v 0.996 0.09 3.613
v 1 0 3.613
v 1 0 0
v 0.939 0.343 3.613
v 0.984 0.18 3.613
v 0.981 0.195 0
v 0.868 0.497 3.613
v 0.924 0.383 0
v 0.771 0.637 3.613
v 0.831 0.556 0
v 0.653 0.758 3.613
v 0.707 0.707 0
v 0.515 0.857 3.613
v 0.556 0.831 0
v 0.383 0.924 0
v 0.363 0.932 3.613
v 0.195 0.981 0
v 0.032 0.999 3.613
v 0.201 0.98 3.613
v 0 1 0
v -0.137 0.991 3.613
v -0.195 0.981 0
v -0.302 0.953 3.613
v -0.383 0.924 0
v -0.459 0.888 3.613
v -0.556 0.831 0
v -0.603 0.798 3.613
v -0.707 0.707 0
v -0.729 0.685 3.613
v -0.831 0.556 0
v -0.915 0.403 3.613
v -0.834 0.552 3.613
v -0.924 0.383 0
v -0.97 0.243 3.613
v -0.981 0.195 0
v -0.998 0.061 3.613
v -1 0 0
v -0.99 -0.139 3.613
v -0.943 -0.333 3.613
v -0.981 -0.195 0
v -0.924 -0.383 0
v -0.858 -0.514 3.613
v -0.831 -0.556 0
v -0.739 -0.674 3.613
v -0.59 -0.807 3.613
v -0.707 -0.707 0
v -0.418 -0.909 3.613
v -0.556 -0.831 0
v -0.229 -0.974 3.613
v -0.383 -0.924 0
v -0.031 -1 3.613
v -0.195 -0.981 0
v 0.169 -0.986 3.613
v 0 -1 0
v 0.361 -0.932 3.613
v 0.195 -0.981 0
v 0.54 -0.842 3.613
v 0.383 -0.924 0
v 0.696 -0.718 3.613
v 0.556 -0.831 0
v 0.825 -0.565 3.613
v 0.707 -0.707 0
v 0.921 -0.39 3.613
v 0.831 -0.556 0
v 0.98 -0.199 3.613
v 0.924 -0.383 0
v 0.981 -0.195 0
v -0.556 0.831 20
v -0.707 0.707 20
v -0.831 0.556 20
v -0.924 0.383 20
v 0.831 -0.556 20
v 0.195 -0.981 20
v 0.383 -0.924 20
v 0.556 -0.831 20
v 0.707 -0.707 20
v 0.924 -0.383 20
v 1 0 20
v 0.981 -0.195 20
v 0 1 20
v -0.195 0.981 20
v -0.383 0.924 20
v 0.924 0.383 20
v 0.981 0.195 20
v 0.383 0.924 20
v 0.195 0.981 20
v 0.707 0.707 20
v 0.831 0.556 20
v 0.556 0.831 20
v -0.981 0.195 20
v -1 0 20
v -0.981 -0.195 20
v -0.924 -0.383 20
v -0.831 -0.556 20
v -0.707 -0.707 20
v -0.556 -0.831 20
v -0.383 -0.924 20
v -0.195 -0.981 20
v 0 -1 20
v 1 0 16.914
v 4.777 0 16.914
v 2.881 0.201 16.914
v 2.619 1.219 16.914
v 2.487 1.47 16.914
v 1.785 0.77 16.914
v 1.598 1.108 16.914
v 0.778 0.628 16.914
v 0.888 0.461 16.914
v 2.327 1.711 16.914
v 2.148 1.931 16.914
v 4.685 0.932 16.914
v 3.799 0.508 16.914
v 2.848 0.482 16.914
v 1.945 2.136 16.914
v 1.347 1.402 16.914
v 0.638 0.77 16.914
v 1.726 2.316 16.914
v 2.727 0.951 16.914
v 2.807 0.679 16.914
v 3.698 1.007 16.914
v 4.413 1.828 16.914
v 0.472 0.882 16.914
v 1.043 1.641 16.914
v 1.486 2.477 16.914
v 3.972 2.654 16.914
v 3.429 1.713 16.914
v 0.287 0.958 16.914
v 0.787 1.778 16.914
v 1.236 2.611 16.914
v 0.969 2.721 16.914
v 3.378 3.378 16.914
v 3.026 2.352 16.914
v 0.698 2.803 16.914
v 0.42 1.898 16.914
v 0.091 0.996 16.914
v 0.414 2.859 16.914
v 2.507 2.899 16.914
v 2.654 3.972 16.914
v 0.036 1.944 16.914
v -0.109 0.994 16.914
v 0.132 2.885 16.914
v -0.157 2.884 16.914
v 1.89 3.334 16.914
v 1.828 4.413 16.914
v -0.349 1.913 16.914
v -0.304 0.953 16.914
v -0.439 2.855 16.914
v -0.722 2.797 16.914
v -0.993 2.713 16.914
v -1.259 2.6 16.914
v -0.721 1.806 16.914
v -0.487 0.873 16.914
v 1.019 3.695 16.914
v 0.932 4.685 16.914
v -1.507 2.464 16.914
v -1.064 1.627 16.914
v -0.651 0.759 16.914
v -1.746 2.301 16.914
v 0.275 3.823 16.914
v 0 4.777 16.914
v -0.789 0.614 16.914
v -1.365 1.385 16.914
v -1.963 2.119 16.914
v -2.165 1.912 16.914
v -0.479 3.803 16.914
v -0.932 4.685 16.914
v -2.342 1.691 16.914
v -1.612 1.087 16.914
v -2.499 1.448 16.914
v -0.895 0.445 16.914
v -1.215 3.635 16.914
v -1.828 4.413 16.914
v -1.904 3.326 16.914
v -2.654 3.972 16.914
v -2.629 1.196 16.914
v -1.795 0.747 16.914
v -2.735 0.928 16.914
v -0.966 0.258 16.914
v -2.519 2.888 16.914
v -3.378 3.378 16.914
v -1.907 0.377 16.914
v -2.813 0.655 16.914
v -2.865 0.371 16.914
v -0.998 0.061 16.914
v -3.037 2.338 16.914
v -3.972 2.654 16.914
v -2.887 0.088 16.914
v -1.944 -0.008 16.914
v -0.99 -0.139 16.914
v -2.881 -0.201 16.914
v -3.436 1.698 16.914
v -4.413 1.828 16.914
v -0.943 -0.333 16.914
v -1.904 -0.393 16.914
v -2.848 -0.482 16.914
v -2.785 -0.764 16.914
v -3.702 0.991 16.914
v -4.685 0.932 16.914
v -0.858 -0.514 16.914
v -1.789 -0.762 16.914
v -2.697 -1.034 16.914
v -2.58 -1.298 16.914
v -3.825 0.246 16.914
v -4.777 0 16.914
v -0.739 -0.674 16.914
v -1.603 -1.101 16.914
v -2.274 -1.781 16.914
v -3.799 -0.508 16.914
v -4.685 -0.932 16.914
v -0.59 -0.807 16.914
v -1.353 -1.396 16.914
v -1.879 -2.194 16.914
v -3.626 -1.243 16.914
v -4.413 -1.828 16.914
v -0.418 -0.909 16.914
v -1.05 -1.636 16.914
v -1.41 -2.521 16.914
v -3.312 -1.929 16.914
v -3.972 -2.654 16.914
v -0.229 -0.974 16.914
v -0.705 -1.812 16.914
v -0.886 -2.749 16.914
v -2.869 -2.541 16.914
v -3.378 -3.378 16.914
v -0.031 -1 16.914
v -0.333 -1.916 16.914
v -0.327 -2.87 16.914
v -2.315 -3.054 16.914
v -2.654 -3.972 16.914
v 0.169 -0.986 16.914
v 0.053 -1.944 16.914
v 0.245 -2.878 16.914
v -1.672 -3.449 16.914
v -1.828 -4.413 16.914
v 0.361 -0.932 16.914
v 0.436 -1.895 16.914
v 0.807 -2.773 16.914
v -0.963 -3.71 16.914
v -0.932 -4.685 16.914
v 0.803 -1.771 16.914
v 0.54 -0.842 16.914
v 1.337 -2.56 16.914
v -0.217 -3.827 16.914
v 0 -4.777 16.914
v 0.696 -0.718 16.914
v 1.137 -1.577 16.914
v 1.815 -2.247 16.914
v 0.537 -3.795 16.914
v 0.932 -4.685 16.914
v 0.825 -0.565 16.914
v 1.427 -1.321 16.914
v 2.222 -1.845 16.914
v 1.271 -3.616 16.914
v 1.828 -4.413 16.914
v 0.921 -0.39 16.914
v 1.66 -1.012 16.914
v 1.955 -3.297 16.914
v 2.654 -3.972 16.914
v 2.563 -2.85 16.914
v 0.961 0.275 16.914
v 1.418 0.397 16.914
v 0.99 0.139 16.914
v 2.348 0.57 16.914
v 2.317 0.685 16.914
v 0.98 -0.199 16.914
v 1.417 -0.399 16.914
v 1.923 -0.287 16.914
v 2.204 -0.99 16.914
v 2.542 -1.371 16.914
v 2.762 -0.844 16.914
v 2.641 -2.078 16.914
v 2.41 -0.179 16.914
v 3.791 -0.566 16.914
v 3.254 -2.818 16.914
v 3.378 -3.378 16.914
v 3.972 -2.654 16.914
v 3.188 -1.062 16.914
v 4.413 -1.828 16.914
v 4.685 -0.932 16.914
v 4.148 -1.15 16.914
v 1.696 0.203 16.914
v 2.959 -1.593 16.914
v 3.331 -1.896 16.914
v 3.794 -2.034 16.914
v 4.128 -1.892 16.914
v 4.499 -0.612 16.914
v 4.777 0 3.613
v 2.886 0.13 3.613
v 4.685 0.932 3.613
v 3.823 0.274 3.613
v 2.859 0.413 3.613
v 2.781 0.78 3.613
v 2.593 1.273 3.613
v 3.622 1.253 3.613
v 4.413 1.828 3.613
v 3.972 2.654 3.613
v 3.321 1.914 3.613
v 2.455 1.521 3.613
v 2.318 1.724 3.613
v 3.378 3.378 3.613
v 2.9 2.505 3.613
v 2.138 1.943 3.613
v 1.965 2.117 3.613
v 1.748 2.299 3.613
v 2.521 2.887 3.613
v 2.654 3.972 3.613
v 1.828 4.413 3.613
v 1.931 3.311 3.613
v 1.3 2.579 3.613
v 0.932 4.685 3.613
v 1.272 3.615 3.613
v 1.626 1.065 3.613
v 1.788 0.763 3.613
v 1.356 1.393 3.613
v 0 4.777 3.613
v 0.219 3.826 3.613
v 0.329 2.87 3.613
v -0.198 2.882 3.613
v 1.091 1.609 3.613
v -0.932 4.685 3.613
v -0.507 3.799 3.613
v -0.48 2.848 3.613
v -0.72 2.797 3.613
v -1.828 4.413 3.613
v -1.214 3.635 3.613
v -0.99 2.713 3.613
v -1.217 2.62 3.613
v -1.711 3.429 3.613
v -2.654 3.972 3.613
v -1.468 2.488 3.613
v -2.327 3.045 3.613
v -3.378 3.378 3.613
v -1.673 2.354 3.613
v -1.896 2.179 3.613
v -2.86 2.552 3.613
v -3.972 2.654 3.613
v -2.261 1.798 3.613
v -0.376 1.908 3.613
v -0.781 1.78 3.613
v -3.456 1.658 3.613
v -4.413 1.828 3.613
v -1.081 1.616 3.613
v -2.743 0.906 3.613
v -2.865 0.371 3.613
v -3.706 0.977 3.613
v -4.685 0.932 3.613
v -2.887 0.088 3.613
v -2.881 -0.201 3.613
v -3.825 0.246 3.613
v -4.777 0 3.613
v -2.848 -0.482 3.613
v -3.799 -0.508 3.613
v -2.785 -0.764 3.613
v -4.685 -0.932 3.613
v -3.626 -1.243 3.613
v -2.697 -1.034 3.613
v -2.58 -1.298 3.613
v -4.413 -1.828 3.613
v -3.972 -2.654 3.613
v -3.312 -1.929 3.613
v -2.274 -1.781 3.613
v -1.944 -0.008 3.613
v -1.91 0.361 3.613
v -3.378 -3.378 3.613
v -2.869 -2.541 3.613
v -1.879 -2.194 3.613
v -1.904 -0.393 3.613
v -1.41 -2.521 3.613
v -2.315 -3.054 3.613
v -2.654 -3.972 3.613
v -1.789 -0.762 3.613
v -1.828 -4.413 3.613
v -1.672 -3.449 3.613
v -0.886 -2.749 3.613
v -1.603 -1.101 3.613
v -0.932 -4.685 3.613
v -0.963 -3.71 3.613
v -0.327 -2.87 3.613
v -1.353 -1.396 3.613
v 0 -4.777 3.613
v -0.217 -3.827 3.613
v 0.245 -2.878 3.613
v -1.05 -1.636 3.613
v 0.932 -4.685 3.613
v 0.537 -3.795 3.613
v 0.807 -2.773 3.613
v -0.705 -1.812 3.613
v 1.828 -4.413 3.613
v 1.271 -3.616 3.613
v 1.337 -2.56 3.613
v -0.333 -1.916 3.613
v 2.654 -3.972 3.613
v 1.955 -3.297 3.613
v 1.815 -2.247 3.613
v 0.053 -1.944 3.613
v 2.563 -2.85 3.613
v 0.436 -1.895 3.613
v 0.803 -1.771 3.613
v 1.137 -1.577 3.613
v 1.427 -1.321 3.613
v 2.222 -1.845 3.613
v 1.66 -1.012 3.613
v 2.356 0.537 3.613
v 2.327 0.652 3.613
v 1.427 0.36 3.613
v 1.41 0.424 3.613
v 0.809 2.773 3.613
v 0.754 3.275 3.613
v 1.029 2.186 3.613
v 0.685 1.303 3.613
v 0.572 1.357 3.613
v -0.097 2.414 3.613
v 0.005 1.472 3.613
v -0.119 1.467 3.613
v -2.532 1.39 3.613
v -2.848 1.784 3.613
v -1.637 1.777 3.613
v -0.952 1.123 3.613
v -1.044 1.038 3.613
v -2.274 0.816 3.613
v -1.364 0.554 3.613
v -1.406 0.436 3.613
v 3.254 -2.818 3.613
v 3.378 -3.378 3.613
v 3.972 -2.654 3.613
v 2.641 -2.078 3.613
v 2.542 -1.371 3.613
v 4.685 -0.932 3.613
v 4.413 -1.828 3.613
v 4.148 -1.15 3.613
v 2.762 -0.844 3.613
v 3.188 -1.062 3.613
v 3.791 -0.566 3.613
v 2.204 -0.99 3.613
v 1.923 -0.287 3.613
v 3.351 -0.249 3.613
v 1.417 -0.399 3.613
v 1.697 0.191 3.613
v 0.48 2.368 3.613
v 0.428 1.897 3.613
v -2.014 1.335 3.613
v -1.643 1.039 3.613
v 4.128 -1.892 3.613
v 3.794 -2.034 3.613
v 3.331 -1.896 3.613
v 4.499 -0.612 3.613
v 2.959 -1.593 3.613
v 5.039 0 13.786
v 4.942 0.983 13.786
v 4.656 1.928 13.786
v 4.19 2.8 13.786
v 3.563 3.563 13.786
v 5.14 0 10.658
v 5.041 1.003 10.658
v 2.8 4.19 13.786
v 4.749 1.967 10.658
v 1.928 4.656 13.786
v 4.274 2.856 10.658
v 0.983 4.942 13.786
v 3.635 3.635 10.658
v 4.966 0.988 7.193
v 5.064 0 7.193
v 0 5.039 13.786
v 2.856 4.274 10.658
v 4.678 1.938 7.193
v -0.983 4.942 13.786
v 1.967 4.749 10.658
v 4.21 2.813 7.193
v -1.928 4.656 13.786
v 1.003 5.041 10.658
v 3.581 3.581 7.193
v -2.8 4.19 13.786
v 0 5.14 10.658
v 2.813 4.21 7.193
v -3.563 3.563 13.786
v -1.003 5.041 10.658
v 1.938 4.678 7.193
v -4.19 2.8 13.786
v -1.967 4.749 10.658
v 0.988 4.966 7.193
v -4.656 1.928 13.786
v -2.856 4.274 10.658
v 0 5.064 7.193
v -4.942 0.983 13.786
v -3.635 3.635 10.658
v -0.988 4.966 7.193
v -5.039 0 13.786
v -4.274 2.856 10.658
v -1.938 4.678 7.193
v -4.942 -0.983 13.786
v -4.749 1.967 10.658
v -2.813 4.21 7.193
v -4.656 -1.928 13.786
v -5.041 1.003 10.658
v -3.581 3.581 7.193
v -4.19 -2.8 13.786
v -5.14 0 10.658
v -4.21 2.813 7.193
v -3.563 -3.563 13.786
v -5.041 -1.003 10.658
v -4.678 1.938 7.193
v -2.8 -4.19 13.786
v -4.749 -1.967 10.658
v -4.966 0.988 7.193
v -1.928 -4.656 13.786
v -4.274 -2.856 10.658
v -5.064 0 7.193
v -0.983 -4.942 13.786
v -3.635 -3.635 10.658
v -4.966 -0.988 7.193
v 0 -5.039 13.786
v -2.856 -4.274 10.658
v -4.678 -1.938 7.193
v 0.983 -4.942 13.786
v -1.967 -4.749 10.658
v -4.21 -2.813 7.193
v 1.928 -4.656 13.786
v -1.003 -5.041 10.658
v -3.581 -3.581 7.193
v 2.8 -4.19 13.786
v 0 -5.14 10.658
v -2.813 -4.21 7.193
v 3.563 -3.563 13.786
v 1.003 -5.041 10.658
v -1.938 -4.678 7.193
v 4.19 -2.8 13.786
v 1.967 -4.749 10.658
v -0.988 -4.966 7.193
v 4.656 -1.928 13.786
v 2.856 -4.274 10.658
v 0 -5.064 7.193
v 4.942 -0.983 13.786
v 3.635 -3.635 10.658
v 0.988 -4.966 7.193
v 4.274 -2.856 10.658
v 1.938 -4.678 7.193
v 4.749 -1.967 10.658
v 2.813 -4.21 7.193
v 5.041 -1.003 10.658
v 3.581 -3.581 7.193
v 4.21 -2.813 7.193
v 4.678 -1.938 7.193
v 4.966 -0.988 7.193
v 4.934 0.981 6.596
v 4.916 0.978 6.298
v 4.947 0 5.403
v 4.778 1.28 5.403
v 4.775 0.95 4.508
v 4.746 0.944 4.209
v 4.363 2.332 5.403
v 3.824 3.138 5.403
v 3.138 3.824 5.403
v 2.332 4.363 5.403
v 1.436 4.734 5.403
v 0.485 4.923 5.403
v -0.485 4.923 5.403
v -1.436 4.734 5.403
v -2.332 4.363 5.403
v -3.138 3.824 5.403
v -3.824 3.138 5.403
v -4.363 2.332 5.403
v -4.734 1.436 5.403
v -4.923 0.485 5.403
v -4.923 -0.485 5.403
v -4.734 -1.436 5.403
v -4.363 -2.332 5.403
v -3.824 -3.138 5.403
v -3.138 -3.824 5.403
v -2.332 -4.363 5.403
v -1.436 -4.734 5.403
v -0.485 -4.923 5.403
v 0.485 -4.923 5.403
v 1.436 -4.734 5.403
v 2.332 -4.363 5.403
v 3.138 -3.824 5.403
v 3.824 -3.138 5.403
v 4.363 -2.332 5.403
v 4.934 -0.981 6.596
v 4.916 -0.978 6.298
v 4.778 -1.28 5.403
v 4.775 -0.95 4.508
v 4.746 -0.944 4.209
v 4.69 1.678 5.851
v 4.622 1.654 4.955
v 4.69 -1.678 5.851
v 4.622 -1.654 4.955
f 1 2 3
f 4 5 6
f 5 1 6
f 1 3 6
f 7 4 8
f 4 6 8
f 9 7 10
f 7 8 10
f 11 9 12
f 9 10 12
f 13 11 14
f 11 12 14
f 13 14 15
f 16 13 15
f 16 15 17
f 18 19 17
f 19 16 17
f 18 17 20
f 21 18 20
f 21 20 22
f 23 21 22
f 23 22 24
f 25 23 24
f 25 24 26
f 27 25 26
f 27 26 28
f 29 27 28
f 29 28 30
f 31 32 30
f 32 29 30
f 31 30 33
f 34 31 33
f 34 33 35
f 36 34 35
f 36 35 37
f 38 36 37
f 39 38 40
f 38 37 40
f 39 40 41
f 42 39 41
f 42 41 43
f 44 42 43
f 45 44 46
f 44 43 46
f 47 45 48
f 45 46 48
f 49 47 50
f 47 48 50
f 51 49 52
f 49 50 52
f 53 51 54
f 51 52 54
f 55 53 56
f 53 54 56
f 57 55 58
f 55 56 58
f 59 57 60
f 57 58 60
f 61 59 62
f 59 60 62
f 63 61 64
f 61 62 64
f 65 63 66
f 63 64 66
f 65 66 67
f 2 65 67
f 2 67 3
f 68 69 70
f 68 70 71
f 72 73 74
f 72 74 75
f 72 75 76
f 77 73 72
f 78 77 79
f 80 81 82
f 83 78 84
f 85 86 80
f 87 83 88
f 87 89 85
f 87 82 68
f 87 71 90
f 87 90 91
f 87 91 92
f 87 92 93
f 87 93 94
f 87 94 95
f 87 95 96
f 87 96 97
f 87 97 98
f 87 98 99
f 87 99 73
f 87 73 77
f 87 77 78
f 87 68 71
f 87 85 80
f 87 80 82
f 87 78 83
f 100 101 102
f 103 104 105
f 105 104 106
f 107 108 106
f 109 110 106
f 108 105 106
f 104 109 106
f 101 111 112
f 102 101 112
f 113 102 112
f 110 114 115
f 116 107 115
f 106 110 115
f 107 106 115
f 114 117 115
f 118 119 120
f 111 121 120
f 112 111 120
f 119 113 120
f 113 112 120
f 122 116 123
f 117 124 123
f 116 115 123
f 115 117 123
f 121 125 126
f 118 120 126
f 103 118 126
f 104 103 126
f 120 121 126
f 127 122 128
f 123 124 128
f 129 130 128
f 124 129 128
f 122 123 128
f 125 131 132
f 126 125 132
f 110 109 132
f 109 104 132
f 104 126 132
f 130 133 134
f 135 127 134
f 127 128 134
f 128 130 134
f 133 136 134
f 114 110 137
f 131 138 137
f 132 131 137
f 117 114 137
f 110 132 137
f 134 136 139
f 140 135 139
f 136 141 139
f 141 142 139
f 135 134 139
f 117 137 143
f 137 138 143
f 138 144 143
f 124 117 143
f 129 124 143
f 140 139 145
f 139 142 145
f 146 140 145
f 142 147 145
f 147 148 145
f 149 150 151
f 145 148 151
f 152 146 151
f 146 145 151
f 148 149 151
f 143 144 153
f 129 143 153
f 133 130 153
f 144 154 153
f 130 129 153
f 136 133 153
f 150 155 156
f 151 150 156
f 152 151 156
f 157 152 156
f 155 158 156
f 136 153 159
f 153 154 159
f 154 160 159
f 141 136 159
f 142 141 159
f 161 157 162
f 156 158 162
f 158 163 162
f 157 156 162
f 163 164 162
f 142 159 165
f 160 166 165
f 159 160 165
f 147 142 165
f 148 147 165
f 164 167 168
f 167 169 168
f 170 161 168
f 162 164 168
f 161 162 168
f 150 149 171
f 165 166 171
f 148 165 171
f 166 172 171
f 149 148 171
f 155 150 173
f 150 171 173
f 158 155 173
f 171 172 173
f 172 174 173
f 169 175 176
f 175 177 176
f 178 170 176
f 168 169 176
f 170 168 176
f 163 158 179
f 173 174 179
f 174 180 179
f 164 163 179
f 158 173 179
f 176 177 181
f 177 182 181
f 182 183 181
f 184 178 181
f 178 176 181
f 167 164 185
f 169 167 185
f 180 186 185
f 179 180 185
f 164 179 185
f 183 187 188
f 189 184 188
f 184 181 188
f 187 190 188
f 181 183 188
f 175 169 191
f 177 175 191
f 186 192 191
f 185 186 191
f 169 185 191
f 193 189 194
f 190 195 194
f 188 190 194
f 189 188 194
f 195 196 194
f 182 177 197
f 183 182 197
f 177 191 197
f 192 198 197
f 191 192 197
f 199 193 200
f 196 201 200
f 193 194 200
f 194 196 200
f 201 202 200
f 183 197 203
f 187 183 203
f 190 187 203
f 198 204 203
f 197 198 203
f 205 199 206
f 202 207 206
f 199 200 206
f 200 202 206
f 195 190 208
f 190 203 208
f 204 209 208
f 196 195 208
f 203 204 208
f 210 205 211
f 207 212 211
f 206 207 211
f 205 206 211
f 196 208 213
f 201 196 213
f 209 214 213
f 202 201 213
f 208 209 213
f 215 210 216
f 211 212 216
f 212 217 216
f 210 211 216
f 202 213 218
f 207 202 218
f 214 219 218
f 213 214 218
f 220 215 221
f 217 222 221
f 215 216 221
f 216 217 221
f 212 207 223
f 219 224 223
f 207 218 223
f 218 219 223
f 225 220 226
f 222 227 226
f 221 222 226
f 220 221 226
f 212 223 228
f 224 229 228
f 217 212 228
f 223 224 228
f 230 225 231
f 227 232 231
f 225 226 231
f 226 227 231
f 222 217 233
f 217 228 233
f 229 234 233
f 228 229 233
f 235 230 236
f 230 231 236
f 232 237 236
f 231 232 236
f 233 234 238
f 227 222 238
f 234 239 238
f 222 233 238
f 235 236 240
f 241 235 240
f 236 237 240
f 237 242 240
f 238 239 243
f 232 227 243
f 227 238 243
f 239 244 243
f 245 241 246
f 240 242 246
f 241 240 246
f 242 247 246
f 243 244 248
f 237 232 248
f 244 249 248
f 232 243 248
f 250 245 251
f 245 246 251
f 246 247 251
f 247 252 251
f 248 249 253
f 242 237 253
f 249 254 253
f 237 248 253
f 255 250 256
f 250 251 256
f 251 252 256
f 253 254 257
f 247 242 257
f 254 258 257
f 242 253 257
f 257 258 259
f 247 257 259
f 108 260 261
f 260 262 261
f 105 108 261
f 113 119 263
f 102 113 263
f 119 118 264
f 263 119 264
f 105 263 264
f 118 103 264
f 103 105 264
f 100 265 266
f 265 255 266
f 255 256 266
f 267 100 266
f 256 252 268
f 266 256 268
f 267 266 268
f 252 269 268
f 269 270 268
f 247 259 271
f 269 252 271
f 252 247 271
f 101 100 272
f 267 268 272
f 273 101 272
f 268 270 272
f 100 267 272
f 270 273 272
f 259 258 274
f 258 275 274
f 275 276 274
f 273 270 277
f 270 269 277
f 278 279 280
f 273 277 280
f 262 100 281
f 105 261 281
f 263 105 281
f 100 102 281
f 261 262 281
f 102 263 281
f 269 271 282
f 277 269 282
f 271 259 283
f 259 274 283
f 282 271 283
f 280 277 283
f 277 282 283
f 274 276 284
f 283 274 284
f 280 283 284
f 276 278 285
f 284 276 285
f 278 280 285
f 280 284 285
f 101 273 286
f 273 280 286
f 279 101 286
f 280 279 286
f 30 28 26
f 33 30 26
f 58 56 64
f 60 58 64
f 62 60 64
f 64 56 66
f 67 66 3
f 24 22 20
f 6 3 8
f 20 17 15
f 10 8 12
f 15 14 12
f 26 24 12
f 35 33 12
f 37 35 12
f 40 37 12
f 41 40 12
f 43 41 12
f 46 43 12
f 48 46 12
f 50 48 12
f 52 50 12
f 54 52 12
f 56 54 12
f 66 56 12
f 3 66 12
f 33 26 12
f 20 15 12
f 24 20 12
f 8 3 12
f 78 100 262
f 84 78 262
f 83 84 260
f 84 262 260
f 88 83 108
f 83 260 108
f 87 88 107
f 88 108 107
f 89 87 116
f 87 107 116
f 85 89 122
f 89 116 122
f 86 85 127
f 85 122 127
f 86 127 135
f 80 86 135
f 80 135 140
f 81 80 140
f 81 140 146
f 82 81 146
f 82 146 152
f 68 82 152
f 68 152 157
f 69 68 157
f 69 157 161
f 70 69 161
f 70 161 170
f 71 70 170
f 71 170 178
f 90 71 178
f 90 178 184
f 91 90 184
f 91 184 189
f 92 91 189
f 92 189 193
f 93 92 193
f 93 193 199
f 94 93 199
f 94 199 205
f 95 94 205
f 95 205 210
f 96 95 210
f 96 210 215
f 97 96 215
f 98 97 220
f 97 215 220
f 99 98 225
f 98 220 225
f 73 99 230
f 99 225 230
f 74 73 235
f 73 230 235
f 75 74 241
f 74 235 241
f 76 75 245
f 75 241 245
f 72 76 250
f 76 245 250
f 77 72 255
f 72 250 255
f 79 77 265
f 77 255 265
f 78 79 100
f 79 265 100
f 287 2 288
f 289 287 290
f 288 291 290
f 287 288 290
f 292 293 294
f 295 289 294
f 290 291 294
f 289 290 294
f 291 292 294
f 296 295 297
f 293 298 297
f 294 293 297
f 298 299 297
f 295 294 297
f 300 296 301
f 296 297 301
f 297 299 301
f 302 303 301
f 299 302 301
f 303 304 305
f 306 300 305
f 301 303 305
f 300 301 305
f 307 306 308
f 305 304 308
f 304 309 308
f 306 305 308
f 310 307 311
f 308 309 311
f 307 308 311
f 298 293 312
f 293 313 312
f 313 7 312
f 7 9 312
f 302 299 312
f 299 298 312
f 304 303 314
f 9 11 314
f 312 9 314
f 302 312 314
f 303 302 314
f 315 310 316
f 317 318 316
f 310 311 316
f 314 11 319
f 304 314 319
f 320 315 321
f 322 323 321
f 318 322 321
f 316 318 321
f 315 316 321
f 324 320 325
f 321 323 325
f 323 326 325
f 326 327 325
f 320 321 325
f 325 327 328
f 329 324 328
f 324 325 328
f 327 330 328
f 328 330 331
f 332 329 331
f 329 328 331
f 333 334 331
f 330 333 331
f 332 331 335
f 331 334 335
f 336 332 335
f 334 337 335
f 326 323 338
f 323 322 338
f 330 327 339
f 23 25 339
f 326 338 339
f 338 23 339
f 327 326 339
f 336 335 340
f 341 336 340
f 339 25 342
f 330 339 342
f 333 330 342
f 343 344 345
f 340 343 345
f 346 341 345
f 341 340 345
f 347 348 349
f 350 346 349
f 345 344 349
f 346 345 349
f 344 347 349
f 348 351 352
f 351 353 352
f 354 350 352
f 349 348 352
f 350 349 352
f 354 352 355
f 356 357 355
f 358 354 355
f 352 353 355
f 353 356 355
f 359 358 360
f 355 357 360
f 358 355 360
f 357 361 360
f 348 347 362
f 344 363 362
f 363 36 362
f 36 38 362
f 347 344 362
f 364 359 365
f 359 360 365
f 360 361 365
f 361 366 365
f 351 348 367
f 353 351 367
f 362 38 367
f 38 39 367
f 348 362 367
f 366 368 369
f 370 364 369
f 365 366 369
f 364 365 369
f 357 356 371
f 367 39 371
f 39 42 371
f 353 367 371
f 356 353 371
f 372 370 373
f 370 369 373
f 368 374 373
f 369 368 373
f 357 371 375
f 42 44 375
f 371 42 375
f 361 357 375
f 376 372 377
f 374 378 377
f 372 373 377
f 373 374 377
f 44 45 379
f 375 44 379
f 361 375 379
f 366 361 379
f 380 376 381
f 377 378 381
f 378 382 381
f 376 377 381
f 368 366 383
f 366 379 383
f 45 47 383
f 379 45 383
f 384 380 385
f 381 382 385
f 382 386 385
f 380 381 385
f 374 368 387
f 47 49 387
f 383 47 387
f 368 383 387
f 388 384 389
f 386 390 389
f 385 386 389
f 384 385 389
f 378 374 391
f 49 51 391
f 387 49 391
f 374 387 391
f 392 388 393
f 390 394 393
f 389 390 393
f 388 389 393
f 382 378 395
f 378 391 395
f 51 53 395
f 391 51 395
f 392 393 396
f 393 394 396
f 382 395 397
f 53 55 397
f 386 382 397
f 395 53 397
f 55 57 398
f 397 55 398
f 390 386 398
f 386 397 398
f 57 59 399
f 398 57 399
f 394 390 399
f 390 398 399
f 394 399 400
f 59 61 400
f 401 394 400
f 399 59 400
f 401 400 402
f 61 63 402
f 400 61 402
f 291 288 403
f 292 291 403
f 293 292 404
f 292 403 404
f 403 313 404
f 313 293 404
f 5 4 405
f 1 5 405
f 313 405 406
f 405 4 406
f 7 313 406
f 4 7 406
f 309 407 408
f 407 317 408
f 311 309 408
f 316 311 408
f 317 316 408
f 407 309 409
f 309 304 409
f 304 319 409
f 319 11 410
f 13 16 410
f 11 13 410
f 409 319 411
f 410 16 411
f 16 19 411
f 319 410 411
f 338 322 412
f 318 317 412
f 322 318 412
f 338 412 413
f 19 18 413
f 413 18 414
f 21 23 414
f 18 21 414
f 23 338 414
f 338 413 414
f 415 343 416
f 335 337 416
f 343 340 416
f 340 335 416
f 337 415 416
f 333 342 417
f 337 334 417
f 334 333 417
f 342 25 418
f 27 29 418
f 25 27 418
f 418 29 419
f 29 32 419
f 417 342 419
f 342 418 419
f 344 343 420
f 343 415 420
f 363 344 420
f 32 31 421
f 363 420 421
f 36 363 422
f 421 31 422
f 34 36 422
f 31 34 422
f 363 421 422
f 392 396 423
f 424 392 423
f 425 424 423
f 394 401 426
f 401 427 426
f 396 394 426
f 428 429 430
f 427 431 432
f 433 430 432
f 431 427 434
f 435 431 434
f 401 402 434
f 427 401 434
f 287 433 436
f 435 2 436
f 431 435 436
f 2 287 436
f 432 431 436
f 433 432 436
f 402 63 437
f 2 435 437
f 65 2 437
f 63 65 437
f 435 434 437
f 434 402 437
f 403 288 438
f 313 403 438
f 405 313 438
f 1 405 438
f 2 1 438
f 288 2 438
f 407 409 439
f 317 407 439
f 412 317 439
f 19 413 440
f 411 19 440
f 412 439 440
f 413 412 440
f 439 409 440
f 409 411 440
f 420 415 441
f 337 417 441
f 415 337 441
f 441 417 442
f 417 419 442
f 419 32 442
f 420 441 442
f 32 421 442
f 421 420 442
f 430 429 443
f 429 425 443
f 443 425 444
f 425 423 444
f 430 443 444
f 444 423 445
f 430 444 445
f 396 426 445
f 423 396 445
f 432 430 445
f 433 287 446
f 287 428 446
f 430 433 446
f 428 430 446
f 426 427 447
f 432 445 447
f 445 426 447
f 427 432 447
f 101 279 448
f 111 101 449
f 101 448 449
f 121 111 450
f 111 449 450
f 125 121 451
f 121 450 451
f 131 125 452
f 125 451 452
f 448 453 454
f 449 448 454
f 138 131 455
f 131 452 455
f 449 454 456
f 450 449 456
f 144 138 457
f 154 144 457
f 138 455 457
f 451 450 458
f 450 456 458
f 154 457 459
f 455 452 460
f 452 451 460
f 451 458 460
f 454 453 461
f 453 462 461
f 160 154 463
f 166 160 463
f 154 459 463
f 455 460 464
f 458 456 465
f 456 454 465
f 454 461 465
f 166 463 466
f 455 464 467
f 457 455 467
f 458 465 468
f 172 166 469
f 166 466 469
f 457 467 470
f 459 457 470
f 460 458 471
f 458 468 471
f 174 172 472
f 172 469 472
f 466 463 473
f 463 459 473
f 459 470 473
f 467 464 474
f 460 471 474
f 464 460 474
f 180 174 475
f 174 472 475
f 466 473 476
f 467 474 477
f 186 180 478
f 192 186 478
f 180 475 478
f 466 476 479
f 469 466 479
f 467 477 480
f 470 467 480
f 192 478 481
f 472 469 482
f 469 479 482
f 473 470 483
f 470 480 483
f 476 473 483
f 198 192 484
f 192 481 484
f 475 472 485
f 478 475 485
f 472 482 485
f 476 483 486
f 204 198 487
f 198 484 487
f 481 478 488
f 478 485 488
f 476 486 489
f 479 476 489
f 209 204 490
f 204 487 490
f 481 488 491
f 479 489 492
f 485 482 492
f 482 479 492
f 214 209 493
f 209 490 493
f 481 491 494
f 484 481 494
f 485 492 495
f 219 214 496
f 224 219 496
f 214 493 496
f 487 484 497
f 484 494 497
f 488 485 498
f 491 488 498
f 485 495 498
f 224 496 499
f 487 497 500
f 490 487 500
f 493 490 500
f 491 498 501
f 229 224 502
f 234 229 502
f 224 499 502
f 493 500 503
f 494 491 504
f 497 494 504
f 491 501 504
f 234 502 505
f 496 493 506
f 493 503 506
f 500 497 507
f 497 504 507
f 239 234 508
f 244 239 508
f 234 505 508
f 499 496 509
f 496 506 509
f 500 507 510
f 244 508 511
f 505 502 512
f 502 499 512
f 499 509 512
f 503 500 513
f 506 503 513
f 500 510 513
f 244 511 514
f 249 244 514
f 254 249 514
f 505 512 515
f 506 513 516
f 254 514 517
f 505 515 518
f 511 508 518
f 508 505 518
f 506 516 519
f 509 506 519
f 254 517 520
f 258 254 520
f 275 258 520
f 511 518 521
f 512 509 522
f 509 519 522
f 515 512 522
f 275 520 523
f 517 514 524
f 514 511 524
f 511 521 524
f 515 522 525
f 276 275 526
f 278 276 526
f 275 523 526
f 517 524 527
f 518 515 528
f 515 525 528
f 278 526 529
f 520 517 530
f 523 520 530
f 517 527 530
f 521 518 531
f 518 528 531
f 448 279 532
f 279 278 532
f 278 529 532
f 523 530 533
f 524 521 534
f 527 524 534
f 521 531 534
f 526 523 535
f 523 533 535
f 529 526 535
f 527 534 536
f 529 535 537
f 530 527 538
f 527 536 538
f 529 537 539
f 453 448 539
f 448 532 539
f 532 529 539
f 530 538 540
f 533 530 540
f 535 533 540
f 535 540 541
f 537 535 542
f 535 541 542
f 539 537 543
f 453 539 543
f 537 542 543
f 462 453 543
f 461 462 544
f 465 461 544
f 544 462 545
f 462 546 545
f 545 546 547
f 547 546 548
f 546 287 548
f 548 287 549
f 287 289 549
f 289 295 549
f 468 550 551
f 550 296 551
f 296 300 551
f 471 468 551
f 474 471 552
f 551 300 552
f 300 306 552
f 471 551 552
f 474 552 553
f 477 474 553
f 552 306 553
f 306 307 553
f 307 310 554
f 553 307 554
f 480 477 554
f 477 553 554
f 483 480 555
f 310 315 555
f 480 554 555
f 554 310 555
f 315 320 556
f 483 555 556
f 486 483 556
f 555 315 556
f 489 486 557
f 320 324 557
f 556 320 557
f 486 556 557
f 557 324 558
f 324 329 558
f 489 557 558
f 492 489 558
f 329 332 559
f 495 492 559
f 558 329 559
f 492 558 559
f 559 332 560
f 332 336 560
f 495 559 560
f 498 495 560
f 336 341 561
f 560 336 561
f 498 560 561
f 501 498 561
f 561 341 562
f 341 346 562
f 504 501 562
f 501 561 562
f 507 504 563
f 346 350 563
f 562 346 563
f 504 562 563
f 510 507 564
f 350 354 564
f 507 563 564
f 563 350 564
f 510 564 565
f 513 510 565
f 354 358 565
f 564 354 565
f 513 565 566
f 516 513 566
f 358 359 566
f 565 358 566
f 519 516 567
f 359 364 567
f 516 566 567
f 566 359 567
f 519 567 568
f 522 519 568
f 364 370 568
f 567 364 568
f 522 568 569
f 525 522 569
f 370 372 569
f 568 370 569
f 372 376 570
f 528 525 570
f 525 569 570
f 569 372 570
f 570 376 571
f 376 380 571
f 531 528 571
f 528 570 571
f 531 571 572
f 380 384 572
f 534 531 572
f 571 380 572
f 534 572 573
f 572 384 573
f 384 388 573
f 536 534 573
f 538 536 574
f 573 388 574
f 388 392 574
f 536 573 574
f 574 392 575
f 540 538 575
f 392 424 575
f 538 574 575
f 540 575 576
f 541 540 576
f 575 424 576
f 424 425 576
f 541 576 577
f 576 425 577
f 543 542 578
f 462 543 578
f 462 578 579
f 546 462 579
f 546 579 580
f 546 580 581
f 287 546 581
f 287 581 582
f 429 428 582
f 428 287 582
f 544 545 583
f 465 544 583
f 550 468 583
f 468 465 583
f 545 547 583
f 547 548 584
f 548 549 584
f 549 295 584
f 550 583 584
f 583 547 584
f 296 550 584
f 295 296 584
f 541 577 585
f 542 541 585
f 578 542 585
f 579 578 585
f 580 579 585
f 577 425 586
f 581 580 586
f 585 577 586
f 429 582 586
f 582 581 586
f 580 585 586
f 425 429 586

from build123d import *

# Parameters (mm, degrees)
SKETCH_1_R      = 1
EXTRUDE_1_DEPTH = 20


with BuildPart() as part:
    # 草图1 → 凸台-拉伸1 (new body)
    with BuildSketch(Plane.XY):
        Circle(SKETCH_1_R)
    extrude(amount=EXTRUDE_1_DEPTH)

    # 扫描2: sweep along a path in 草图3
    with BuildLine(Plane.XY.offset(10)) as sweep_2_path:
        CenterArc((0, 0), 0.751629147, 0, 360)
    # 草图2 → 扫描2 (sweep)
    with BuildSketch(Plane(origin=(0, 0, 0), x_dir=(1, 0, 0), z_dir=(0, 1, 0))):
        with BuildLine():
            Line((0, -3.612773255), (4.77690428, -3.612773255))
            add(Edge.make_bspline(
                [(4.77690428, -3.612773255), (5.505867442, -10.261978207), (4.77690428, -16.914339916)],
                knots=[0, 0, 0, 1, 1, 1], degree=2))
            Line((4.77690428, -16.914339916), (0, -16.914339916))
            Line((0, -16.914339916), (0, -3.612773255))
        make_face()
    sweep(path=sweep_2_path.line)


solid = part.part
